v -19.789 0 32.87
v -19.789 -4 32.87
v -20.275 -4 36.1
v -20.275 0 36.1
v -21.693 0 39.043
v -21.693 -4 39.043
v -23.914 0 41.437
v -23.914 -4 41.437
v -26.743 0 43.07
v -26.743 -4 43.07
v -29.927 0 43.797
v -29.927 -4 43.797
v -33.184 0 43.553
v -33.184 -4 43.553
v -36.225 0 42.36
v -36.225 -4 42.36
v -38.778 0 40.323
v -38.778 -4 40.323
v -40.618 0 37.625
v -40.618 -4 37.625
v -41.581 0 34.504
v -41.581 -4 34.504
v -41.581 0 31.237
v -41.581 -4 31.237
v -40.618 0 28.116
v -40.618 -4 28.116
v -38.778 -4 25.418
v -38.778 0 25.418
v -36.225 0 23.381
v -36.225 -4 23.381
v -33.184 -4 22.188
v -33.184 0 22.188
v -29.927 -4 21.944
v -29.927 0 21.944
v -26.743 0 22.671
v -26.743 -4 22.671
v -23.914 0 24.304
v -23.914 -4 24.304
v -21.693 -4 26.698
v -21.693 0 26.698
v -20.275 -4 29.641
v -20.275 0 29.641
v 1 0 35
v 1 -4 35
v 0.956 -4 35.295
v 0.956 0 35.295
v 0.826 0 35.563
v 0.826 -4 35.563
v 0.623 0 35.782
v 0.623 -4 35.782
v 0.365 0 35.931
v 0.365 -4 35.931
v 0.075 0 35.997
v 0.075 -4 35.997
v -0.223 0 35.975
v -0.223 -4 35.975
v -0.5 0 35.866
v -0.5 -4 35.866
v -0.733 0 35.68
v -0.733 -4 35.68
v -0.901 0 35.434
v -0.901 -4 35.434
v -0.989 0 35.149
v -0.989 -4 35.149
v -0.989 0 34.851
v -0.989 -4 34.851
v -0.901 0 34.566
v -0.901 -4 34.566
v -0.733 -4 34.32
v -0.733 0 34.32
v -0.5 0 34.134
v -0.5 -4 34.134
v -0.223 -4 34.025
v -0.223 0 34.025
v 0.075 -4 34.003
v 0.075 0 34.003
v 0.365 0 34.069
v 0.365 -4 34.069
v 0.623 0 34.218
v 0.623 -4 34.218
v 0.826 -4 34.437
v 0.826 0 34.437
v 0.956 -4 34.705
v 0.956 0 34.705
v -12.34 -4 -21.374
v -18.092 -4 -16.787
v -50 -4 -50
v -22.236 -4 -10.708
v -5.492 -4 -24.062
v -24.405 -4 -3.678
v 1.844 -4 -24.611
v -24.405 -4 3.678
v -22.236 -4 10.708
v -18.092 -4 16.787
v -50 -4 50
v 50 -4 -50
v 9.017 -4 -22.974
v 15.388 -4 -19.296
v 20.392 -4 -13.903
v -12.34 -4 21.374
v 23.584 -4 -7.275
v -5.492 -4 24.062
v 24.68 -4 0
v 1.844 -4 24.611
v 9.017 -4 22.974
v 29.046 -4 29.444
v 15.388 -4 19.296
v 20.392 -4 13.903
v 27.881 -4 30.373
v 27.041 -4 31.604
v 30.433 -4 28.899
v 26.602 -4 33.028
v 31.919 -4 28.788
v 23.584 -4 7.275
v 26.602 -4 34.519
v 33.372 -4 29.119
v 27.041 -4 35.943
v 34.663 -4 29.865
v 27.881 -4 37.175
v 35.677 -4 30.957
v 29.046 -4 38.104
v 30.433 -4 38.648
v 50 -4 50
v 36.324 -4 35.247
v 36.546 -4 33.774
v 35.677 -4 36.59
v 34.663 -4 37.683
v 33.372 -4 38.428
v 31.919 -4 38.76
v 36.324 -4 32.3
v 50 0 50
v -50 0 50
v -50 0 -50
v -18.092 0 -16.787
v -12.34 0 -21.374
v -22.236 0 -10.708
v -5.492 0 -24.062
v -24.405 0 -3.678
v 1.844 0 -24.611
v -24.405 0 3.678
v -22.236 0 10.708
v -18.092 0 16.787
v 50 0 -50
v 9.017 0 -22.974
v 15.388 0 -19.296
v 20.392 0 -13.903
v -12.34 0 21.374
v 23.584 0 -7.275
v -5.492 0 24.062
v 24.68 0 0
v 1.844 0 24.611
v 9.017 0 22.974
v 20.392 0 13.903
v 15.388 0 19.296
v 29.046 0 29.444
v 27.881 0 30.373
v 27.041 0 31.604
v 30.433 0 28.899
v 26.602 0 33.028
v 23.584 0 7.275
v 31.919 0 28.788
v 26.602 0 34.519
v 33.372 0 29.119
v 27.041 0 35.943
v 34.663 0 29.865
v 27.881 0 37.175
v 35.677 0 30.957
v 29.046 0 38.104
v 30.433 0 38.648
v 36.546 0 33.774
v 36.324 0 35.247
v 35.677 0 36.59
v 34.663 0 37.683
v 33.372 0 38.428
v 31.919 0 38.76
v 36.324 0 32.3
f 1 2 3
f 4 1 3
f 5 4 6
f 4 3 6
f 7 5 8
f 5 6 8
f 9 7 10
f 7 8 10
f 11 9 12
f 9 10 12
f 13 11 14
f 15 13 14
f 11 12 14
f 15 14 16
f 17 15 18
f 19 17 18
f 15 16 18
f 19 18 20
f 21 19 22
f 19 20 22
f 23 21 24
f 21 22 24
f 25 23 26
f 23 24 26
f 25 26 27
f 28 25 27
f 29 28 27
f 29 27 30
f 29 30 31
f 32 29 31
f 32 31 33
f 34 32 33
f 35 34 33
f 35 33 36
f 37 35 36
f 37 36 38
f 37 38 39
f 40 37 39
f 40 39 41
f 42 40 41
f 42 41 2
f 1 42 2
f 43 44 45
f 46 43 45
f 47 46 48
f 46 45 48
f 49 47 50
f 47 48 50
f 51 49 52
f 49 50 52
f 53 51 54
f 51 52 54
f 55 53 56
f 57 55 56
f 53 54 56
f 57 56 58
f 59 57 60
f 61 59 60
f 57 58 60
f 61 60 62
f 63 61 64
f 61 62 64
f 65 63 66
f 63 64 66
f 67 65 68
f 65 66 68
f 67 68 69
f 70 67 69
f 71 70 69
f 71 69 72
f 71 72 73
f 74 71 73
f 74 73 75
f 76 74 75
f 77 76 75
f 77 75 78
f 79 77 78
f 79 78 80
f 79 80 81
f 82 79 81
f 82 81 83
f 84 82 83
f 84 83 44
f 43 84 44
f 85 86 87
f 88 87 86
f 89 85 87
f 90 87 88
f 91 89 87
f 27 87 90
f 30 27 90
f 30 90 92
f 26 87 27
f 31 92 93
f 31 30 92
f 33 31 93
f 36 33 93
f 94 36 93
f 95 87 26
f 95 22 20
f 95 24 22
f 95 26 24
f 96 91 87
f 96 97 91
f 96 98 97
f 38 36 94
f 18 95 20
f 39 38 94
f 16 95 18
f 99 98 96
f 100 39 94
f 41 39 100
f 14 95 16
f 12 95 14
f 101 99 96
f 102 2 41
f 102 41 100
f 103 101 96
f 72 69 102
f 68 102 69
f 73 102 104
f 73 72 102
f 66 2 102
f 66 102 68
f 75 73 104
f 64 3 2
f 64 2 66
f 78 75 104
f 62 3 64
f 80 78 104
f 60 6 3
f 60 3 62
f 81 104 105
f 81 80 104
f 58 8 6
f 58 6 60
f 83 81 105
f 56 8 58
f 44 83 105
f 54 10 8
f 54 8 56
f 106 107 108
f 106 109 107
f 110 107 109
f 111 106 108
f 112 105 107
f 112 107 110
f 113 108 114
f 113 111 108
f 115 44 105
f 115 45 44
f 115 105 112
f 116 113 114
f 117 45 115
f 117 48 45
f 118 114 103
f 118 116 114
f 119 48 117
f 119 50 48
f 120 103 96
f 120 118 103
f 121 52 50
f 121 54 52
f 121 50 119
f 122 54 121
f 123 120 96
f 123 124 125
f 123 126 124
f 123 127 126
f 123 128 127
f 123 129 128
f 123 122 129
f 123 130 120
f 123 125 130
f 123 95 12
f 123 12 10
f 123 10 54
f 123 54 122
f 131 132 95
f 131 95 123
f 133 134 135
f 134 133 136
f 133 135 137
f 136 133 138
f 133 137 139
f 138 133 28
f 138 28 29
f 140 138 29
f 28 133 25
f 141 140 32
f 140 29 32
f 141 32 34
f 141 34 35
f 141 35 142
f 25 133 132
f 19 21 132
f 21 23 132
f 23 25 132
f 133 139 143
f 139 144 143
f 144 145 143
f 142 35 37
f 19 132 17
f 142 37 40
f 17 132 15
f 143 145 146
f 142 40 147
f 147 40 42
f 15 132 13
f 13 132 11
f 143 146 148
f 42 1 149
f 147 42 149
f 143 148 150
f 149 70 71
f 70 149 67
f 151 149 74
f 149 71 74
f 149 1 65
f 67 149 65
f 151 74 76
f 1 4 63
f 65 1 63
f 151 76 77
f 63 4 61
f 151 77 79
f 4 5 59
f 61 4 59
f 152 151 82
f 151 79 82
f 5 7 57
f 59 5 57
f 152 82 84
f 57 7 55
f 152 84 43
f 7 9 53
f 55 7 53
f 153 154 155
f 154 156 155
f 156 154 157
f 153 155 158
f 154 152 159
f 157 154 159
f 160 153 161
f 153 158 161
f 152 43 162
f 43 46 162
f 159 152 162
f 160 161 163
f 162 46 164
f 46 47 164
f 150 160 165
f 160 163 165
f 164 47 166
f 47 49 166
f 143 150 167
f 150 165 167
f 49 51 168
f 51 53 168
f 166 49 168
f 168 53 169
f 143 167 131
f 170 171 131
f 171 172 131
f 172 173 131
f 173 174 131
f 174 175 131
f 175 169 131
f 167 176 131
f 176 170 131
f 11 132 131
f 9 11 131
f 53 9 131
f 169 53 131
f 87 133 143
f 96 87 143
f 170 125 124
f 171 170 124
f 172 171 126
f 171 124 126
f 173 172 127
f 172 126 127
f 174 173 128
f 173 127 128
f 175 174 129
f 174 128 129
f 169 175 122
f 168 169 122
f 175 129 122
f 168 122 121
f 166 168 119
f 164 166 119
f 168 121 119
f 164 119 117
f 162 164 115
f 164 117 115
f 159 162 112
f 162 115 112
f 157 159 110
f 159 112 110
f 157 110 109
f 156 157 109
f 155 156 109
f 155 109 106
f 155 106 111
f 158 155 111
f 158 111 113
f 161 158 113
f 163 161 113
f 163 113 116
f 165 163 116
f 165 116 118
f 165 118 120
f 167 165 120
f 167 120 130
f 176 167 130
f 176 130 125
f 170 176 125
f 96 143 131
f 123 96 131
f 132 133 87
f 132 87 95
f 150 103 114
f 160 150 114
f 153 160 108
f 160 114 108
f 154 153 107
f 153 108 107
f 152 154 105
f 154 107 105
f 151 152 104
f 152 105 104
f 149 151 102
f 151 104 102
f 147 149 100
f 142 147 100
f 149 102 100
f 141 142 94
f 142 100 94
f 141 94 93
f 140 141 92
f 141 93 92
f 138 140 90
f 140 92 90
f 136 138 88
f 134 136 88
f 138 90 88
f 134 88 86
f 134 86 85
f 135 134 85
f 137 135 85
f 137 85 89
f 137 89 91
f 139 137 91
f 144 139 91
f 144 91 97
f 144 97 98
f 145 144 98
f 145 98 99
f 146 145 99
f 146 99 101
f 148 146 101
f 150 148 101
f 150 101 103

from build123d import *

# Parameters (mm, degrees)
F0_W     = 100
F0_H     = 100
F1_DEPTH = 4
F2_R     = 24.680496
F3_DEPTH = 25
F4_R     = 5
F5_DEPTH = 25
F6_R     = 10.957285
F7_DEPTH = 25
F8_R     = 1
F9_DEPTH = 4.001


with BuildPart() as f1:
    # F0 (on Front) → F1 (new body)
    with BuildSketch(Plane.XZ):
        Rectangle(F0_W, F0_H)
    extrude(amount=F1_DEPTH)

    # F2 (on face) → F3 (cut)
    with BuildSketch(Plane.XZ.offset(4)):
        Circle(F2_R)
    extrude(amount=-F3_DEPTH, mode=Mode.SUBTRACT)

    # F4 (on face) → F5 (cut)
    with BuildSketch(Plane.XZ.offset(4)):
        with Locations((31.545788, 33.773698)):
            Circle(F4_R)
    extrude(amount=-F5_DEPTH, mode=Mode.SUBTRACT)

    # F6 (on face) → F7 (cut)
    with BuildSketch(Plane.XZ.offset(4)):
        with Locations((-30.745968, 32.870423)):
            Circle(F6_R)
    extrude(amount=-F7_DEPTH, mode=Mode.SUBTRACT)

    # F8 (on face) → F9 (cut, through all)
    with BuildSketch(Plane.XZ.offset(4)):
        with Locations((0, 35)):
            Circle(F8_R)
    extrude(amount=-F9_DEPTH, mode=Mode.SUBTRACT)


solid = f1.part
